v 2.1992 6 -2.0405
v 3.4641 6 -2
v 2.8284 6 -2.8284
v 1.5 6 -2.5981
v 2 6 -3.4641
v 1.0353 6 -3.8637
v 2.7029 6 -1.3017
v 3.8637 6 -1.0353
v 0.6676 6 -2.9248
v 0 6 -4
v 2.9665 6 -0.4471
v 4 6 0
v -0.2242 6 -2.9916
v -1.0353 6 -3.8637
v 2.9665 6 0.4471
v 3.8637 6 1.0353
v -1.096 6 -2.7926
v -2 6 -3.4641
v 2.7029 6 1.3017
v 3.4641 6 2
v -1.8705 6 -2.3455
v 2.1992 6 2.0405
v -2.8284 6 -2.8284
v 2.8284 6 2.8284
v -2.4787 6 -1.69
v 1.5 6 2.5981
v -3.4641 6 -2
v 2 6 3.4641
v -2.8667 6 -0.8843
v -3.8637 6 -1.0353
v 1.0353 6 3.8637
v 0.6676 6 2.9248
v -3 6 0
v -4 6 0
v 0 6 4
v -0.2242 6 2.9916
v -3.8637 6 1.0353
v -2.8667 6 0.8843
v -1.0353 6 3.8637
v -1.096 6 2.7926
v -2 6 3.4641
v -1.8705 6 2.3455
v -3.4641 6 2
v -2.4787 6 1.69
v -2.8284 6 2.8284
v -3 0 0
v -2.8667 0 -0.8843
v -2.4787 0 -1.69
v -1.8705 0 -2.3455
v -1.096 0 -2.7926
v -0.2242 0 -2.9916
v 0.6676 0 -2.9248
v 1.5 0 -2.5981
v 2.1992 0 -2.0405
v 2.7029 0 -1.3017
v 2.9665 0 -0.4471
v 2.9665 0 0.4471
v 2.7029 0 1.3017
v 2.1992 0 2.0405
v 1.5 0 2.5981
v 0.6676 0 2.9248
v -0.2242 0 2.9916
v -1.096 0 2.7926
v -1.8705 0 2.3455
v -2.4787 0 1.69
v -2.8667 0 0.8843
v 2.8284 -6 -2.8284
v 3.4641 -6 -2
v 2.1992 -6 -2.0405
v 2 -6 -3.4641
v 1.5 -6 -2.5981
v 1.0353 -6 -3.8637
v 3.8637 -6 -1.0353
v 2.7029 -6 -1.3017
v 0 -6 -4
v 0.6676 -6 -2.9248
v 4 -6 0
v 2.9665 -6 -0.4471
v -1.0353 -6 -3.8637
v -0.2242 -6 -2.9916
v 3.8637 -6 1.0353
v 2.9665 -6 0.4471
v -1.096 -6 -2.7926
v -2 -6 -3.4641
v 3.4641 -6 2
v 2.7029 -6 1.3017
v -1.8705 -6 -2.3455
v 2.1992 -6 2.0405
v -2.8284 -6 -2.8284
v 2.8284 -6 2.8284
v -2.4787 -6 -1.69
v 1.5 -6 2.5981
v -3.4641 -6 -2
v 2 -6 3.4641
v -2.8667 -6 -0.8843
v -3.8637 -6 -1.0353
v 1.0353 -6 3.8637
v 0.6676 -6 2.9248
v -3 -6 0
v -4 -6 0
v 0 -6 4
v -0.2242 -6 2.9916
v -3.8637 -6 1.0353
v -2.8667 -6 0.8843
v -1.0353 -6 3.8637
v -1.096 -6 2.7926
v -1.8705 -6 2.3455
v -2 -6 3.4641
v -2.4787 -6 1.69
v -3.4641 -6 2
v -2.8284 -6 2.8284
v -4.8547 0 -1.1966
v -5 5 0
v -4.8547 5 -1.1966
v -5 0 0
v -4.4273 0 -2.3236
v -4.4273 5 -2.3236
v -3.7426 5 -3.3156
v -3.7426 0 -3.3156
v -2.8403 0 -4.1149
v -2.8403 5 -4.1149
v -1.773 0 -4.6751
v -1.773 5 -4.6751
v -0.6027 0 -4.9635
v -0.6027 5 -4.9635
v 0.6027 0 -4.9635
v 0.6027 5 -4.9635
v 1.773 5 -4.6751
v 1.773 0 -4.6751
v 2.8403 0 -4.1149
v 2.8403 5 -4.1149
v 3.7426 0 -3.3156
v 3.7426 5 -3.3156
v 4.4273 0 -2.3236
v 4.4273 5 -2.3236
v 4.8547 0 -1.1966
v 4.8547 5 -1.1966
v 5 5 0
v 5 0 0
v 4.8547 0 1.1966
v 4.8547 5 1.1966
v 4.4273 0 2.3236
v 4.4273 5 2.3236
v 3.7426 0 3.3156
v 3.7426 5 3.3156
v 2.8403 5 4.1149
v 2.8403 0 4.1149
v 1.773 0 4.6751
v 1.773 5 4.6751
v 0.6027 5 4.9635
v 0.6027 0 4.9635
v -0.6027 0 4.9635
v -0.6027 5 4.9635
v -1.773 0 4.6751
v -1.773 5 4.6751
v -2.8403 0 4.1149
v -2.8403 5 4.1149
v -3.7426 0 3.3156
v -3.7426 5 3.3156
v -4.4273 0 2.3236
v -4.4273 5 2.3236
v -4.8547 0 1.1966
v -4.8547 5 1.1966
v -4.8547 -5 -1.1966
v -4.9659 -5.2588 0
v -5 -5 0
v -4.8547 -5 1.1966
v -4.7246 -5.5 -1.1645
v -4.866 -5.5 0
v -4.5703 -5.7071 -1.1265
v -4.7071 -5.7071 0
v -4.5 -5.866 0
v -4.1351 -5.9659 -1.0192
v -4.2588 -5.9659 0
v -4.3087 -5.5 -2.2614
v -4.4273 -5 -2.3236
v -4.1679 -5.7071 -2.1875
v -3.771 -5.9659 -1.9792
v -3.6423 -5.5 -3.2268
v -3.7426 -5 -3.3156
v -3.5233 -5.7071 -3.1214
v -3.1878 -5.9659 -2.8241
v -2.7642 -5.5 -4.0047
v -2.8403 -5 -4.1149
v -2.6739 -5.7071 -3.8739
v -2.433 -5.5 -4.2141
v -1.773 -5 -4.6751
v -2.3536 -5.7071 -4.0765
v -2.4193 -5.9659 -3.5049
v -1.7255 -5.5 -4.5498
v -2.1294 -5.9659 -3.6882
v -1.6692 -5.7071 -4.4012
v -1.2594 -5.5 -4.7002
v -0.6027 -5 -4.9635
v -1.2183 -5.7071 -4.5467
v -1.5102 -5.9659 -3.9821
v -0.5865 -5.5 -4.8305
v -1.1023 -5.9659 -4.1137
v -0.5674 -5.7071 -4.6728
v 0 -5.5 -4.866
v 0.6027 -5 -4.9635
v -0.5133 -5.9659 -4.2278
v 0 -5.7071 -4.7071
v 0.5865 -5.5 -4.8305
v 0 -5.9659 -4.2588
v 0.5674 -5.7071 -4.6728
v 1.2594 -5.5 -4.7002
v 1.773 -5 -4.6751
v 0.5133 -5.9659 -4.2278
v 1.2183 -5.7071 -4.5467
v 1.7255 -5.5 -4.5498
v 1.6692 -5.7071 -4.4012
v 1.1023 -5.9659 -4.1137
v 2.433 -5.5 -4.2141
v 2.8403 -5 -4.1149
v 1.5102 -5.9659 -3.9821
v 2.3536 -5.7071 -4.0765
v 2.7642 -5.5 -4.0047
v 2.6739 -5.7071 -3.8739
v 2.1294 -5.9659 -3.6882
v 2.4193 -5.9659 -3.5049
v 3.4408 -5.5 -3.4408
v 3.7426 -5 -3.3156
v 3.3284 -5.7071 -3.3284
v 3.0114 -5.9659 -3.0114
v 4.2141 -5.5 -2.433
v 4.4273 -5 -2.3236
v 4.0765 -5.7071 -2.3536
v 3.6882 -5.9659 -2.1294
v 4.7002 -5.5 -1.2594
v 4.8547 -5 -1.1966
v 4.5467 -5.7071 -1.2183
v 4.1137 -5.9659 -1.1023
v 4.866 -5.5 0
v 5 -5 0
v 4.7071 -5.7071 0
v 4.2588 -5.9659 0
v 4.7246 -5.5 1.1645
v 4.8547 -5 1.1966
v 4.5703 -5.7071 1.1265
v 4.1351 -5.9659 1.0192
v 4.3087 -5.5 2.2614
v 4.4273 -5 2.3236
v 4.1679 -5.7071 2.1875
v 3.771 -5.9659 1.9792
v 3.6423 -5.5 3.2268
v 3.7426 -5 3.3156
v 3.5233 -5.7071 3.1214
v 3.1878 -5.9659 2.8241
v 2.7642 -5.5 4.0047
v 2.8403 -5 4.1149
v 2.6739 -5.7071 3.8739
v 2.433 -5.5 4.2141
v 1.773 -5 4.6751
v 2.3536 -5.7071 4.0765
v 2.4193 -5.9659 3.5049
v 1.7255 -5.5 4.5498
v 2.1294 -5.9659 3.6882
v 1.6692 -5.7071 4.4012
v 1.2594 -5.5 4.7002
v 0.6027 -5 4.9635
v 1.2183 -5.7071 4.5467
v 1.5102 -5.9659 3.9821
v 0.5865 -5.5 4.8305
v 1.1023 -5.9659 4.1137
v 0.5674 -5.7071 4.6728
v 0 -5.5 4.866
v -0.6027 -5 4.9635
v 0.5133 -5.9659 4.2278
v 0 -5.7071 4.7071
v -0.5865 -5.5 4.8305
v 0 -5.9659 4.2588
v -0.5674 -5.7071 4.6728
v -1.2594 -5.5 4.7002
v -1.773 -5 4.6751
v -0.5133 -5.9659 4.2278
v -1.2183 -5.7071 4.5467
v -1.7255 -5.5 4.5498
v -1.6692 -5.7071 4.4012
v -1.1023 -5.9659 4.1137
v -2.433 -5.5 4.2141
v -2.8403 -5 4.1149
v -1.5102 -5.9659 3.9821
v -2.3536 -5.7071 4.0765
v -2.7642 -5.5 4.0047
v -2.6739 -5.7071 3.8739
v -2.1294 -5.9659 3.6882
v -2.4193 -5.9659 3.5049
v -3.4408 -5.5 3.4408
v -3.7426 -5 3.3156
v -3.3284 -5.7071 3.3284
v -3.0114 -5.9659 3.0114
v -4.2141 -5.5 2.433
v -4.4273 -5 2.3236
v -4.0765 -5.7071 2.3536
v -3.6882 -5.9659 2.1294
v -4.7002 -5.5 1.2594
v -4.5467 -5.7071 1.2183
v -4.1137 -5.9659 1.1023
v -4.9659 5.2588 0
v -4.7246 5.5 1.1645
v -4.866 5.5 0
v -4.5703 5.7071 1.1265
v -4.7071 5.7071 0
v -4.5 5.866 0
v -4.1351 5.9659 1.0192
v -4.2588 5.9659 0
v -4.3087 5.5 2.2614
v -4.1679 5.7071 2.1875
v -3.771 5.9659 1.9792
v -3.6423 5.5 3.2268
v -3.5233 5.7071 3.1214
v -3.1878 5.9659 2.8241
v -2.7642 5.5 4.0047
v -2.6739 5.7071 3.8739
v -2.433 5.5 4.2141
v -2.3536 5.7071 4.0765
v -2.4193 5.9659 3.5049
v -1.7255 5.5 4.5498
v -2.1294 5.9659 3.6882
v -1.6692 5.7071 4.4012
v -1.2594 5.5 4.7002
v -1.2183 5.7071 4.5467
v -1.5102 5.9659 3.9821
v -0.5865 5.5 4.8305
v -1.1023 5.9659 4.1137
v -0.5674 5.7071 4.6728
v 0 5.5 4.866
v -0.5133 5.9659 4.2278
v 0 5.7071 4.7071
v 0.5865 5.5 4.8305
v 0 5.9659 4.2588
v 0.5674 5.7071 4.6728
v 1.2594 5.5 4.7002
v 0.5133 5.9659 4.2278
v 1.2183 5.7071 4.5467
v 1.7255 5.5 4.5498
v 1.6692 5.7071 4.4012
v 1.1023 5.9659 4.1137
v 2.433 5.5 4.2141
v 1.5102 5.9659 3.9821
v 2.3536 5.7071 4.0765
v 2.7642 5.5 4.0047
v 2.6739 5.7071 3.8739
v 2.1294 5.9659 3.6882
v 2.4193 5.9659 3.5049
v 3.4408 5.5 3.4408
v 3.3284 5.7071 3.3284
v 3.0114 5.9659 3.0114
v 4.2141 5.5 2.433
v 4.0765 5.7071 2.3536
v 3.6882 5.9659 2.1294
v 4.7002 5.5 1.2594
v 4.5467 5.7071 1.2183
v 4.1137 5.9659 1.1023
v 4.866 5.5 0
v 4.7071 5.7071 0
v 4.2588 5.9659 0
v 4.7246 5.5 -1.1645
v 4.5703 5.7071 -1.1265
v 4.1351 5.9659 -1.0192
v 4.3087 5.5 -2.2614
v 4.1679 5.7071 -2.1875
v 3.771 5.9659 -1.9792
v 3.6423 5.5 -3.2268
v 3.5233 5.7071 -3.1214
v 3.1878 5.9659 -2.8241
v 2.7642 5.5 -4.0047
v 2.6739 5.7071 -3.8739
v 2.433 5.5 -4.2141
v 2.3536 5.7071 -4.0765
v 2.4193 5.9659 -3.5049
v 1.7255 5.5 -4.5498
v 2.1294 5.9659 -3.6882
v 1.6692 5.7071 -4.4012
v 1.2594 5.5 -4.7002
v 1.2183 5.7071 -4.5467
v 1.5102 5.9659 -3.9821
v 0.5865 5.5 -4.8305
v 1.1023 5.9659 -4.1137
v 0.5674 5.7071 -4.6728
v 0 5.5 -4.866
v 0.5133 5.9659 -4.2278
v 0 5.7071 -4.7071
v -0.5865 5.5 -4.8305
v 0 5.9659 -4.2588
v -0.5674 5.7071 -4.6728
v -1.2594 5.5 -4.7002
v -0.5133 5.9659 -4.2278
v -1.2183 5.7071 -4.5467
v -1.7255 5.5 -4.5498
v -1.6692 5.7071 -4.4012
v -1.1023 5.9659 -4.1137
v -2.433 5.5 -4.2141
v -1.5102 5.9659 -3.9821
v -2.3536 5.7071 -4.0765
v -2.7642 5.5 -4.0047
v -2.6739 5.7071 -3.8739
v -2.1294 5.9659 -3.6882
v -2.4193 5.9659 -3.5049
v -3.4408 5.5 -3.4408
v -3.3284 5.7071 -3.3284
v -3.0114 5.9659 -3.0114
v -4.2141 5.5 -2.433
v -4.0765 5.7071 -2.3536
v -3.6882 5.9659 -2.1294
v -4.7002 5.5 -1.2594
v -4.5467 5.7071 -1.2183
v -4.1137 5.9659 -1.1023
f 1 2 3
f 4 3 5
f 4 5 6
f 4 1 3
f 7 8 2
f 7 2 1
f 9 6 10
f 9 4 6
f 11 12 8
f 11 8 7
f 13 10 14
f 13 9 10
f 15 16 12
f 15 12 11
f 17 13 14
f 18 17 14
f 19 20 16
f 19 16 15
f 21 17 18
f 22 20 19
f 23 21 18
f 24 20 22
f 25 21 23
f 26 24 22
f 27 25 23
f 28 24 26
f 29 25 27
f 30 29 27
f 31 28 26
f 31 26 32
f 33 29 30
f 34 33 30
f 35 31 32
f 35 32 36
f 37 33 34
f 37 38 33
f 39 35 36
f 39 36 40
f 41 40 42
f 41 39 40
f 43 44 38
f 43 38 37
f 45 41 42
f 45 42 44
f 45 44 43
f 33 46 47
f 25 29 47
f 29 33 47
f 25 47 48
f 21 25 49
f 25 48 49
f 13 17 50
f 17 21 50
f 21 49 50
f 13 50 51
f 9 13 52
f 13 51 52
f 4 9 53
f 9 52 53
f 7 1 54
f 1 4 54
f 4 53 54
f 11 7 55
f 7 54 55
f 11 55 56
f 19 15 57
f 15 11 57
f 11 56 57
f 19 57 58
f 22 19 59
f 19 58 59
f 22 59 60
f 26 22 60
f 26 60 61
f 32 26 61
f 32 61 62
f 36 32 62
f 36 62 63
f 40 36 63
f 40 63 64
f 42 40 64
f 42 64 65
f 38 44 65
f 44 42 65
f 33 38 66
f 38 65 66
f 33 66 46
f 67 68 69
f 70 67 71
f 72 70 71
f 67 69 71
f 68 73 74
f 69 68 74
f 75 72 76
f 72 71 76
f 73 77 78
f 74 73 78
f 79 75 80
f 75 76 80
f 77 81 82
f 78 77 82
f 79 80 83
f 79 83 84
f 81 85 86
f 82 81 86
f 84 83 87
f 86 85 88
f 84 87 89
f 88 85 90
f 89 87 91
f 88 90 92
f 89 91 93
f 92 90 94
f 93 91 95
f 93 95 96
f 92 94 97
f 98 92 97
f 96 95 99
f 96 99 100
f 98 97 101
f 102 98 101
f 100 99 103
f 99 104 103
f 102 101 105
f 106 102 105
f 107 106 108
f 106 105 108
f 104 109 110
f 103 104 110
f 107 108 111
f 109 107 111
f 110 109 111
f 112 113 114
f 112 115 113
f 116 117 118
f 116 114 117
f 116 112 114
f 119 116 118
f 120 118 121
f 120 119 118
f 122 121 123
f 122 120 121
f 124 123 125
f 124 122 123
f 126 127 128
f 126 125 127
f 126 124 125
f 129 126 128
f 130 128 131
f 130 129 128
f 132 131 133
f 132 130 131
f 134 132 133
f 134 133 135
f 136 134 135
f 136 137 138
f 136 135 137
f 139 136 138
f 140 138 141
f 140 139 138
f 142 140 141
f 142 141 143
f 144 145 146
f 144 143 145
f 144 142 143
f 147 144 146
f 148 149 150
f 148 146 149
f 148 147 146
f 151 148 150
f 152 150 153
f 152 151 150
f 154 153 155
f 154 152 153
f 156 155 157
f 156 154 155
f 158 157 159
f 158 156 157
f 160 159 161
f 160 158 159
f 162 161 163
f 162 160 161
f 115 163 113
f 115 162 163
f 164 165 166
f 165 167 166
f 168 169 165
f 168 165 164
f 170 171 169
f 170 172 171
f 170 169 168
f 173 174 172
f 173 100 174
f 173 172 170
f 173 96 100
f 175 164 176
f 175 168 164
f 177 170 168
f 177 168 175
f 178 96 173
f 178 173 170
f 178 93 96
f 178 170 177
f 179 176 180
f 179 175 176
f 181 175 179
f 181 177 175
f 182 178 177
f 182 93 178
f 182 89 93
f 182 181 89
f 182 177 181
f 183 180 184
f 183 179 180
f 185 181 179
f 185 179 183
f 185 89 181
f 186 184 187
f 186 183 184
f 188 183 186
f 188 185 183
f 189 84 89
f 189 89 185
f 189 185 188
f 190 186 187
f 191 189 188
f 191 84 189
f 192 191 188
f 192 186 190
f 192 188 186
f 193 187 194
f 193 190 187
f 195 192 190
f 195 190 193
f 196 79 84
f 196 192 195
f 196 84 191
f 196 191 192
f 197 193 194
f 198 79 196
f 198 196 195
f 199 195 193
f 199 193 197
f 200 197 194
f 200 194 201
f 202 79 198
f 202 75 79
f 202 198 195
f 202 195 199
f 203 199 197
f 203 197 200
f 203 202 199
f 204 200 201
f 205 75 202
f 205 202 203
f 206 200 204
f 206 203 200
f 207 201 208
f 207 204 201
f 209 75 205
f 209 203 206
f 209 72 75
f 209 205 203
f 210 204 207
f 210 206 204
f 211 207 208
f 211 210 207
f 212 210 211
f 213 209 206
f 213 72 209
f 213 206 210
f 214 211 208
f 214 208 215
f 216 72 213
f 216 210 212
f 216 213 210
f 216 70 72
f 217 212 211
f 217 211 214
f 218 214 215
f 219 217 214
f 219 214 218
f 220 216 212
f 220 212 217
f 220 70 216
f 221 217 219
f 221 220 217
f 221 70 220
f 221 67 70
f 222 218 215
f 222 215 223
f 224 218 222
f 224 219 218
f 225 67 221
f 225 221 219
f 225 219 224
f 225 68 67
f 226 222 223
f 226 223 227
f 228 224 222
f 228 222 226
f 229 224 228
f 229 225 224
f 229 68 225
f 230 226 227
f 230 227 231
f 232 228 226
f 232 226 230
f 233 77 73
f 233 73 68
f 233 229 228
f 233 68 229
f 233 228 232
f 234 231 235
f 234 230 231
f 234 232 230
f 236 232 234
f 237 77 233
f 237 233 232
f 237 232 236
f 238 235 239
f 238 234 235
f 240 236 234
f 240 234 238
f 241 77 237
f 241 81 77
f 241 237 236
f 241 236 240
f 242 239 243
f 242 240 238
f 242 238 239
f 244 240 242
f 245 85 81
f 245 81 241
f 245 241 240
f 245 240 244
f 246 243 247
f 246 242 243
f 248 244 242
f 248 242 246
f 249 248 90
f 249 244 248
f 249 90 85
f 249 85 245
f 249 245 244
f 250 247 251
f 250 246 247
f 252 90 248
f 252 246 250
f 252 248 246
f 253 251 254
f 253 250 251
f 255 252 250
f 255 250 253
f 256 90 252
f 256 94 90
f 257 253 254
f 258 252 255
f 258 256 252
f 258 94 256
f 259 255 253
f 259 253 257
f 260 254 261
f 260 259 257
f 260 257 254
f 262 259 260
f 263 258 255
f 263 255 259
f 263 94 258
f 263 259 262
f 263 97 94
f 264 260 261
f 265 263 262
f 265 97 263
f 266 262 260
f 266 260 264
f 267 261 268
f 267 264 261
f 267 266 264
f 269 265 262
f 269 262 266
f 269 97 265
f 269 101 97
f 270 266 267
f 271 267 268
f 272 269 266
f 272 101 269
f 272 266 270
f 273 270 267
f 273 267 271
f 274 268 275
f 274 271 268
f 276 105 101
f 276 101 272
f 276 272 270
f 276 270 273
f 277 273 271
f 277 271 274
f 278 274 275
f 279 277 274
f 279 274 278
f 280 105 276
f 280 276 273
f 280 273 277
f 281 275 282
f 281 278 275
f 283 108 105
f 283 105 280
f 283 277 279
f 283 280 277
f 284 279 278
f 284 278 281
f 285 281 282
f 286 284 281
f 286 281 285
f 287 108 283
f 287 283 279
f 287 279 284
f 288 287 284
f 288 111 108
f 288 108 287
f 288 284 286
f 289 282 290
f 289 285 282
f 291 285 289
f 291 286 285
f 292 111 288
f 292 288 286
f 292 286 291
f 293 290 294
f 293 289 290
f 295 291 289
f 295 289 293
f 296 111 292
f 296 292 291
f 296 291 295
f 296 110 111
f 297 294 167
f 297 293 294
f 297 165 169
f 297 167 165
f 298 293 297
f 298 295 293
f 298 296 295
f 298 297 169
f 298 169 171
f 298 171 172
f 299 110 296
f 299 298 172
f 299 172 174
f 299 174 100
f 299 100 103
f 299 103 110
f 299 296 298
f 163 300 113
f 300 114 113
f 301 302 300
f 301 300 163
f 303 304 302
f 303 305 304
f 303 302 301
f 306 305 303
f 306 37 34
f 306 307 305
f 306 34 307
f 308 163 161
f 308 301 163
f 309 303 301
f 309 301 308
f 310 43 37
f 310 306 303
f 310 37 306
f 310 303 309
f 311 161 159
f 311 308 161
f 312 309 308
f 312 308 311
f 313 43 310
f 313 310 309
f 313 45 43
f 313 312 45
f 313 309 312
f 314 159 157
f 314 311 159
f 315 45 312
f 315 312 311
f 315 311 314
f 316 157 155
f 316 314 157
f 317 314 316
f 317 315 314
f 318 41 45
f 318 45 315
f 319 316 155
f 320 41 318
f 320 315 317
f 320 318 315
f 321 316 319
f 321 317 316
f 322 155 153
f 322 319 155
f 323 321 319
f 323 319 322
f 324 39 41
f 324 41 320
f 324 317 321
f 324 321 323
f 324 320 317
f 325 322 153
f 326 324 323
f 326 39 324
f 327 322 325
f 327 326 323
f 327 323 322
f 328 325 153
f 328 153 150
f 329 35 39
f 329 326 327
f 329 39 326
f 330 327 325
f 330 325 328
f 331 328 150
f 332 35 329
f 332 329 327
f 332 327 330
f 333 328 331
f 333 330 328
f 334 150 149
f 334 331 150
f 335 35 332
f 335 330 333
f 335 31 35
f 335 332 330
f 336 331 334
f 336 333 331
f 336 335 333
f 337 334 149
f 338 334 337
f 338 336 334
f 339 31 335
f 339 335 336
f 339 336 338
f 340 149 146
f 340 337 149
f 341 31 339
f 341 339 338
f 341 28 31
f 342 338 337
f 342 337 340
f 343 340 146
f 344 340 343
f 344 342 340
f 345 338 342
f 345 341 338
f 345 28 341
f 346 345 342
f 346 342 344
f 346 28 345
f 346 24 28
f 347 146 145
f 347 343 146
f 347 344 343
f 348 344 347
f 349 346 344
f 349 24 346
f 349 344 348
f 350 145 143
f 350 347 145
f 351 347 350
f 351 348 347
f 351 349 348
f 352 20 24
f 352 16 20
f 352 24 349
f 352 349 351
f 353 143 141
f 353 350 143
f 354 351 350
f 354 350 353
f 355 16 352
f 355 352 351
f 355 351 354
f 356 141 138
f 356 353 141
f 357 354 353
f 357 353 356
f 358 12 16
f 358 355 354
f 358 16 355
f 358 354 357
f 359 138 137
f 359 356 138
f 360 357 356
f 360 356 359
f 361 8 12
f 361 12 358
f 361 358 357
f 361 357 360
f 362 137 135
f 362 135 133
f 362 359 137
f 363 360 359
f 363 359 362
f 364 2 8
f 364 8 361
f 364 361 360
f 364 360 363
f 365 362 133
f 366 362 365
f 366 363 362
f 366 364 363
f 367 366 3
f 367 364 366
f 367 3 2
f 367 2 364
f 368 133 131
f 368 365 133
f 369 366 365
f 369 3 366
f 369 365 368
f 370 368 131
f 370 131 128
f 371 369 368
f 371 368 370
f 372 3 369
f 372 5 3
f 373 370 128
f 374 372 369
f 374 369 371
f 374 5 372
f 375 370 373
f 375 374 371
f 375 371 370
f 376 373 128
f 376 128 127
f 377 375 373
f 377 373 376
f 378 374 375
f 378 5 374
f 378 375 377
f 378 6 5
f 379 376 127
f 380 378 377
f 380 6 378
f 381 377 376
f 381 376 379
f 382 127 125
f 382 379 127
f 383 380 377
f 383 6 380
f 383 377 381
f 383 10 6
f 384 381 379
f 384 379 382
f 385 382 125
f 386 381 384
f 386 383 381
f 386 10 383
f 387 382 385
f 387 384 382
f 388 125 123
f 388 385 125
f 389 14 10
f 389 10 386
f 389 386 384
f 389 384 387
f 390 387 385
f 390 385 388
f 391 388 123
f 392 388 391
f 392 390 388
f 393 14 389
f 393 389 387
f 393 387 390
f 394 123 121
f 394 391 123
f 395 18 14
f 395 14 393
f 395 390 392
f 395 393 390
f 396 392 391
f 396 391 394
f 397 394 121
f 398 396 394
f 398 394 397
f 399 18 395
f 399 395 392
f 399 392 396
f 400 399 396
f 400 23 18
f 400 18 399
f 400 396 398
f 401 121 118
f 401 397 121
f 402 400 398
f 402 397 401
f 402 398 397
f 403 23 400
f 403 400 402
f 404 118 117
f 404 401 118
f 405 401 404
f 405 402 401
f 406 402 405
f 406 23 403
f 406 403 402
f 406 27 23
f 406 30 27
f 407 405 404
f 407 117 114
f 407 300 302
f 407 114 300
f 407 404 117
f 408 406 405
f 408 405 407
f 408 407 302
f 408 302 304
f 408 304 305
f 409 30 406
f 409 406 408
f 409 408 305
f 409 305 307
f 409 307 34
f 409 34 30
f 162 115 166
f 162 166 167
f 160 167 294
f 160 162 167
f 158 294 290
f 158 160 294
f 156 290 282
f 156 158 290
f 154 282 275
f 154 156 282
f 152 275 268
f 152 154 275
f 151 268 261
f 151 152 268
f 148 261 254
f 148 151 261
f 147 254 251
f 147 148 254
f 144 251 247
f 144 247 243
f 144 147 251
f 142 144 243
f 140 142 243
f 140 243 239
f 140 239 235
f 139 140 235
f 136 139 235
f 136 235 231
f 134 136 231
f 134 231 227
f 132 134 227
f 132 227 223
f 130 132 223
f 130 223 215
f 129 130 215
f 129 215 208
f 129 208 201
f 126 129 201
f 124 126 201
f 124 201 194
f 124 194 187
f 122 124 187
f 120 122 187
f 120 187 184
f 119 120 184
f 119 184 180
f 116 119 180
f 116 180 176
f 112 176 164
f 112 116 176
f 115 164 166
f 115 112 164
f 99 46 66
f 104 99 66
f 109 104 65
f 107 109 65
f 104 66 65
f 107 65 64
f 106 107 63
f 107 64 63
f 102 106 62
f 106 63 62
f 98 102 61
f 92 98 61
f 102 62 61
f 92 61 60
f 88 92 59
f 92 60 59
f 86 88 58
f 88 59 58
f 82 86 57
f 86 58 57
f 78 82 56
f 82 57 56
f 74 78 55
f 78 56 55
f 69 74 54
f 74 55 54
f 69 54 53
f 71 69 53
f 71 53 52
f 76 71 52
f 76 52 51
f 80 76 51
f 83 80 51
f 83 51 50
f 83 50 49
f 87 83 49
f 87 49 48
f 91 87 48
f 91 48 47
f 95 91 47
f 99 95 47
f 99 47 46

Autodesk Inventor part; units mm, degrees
ref_plane "YZ Plane" through (0, 0, 0) normal (1, 0, 0) x (0, 1, 0)
ref_plane "XZ Plane" through (0, 0, 0) normal (0, 1, 0) x (-1, 0, 0)
ref_plane "XY Plane" through (0, 0, 0) normal (0, 0, 1) x (1, 0, 0)
sketch "Skizze1" plane through (0, 0, 0) normal (0, 1, 0) x (-1, 0, 0)
  circle A0 centre (0, 0) radius 5
  circle A1 centre (0, 0) radius 3
  dimension "d0" = 10
  dimension "d1" = 6
extrude "Extrusion1" add sketch "Skizze1" along normal mid plane 12
fillet "Rundung1" radius 1 2 edges at (5, -6, 0) (5, 6, 0)
properties part number "BromzeFitting" material "Bronze, Guss"
